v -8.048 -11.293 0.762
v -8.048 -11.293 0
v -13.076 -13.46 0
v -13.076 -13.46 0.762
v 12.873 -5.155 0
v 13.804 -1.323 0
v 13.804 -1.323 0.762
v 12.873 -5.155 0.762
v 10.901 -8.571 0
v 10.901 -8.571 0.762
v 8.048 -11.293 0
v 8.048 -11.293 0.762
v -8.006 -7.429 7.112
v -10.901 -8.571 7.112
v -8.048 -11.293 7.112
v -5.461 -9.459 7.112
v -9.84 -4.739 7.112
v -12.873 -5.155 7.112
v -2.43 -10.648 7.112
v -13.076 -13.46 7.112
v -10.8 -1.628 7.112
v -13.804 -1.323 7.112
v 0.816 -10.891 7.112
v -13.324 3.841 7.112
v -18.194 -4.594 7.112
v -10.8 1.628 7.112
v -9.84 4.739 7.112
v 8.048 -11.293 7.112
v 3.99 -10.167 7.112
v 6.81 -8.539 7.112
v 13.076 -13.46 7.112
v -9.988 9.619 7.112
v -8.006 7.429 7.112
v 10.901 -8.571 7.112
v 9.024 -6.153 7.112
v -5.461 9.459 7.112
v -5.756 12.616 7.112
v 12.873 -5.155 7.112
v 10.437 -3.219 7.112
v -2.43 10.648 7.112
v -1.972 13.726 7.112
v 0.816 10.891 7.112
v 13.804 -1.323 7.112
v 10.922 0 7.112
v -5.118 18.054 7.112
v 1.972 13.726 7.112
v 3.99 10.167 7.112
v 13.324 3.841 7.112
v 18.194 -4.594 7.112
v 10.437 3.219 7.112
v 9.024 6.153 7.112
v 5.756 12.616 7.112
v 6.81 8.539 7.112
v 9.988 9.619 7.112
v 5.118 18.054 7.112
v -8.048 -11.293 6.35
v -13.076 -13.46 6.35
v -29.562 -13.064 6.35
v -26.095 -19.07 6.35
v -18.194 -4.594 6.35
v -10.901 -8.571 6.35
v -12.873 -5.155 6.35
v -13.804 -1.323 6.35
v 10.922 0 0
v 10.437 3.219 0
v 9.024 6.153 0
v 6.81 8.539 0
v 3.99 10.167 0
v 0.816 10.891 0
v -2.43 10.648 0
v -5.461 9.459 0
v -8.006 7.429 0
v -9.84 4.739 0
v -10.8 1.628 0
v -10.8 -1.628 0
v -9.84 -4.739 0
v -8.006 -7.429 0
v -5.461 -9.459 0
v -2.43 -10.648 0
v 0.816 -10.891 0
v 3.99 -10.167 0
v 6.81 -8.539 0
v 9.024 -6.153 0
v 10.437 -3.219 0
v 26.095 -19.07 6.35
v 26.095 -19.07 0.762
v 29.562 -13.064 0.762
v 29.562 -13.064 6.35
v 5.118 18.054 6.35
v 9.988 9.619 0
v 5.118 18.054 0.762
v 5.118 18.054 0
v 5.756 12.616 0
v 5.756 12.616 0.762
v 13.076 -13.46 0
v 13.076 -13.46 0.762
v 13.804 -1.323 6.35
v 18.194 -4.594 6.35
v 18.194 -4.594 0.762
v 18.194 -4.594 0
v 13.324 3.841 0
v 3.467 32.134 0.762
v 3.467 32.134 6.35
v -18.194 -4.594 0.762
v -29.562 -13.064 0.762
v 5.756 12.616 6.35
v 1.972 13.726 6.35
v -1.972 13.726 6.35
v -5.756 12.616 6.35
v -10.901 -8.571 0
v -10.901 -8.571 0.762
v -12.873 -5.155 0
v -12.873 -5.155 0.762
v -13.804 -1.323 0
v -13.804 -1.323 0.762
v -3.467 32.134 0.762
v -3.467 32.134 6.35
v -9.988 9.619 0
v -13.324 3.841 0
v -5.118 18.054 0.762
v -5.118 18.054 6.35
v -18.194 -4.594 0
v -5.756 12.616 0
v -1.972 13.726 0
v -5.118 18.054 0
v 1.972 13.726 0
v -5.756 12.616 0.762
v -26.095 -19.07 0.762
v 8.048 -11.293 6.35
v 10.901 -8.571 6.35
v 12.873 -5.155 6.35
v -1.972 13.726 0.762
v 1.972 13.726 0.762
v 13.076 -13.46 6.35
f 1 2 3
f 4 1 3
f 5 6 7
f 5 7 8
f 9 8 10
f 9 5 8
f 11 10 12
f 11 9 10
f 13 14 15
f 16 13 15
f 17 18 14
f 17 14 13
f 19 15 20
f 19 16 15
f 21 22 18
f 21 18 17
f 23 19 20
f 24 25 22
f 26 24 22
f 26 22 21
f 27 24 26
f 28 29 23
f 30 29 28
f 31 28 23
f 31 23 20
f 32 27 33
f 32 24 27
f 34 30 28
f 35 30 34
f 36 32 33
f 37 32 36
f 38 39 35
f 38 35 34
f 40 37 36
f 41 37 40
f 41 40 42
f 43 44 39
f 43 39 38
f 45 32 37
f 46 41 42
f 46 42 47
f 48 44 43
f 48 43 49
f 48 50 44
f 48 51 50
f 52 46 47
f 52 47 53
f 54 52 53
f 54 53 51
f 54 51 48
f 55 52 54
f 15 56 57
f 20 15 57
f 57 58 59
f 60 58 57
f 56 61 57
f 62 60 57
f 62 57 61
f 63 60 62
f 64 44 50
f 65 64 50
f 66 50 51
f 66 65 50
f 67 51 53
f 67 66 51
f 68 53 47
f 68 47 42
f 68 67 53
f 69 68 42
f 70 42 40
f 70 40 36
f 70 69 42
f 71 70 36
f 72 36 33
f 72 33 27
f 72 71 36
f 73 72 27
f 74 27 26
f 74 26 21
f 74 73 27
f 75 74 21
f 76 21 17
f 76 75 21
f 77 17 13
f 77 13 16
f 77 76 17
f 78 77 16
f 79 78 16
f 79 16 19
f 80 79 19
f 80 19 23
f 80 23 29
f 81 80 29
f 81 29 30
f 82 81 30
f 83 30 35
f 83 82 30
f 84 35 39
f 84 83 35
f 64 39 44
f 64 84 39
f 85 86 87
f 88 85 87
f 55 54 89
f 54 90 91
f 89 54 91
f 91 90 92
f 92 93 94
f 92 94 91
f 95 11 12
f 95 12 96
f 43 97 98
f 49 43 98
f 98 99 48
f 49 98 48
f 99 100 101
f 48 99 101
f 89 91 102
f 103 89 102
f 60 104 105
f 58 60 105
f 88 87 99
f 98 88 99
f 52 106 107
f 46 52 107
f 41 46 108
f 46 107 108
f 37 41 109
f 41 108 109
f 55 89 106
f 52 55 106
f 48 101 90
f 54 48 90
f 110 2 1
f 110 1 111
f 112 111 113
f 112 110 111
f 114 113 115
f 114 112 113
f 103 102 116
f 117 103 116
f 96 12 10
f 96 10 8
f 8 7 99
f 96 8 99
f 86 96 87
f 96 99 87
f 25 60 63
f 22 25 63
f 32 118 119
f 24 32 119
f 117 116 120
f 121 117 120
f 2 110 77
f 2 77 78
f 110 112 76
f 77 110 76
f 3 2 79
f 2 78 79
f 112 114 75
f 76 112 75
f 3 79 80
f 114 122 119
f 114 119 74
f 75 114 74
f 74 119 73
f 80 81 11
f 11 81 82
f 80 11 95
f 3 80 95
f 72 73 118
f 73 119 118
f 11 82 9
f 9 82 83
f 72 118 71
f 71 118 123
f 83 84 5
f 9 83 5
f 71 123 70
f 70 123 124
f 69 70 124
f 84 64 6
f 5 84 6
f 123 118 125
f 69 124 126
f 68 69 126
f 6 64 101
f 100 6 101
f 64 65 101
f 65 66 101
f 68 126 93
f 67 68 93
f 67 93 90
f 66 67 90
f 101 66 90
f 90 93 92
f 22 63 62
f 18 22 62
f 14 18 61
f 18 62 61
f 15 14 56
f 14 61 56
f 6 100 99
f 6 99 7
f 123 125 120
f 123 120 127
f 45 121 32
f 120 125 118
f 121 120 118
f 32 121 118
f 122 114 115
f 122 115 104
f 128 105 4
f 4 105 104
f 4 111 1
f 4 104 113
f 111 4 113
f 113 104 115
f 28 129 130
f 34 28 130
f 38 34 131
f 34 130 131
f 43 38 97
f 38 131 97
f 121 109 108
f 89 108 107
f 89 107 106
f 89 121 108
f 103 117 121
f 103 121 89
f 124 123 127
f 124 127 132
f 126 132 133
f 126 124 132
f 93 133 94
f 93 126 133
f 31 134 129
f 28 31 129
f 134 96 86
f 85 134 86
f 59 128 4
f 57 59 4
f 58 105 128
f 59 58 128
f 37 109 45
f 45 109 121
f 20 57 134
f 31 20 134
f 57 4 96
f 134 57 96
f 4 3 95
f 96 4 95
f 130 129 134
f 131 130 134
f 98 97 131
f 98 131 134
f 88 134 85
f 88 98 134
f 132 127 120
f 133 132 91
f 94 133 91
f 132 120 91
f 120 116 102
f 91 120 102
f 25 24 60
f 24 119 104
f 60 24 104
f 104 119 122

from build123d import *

# Parameters (mm, degrees)
F0_R     = 10.922
F1_DEPTH = 7.112
F2_DEPTH = 6.35
F3_DEPTH = 0.762
F4_DEPTH = 7.112


with BuildPart() as f1:
    # F0 (on Top) → F1 (new body)
    with BuildSketch(Plane.XY):
        with BuildLine():
            Line((-5.7560840378, 12.6157379826), (-5.1183423957, 18.0540294813))
            Line((-5.1183423957, 18.0540294813), (-9.9884684203, 9.6187237673))
            ThreePointArc((-9.9884684203, 9.6187237673), (-8.0136294261, 11.3168499026), (-5.7560840378, 12.6157379826))
        make_face()
        with BuildLine():
            ThreePointArc((5.7560840378, 12.6157379826), (0, 13.8668434871), (-5.7560840378, 12.6157379826))
            ThreePointArc((-5.7560840378, 12.6157379826), (-8.0136294261, 11.3168499026), (-9.9884684203, 9.6187237673))
            Line((-9.9884684203, 9.6187237673), (-13.3242933447, 3.8409055132))
            ThreePointArc((-13.3242933447, 3.8409055132), (-13.8074942195, 1.2815817082), (-13.8035915993, -1.3229539883))
            ThreePointArc((-13.8035915993, -1.3229539883), (-12.0090387301, -6.9334217436), (-8.0475075615, -11.2927839943))
            ThreePointArc((-8.0475075615, -11.2927839943), (-5.7938647934, -12.5984316108), (-3.3358249243, -13.4596292806))
            Line((-3.3358249243, -13.4596292806), (3.3358249243, -13.4596292806))
            ThreePointArc((3.3358249243, -13.4596292806), (5.7938647934, -12.5984316108), (8.0475075615, -11.2927839943))
            ThreePointArc((8.0475075615, -11.2927839943), (12.0090387301, -6.9334217436), (13.8035915993, -1.3229539883))
            ThreePointArc((13.8035915993, -1.3229539883), (13.8510214888, -0.6622325982), (13.8668434871, 0))
            ThreePointArc((13.8668434871, 0), (13.730536018, 1.9395177119), (13.3242933447, 3.8409055132))
            Line((13.3242933447, 3.8409055132), (9.9884684203, 9.6187237673))
            ThreePointArc((9.9884684203, 9.6187237673), (8.0136294261, 11.3168499026), (5.7560840378, 12.6157379826))
        make_face()
        Circle(F0_R, mode=Mode.SUBTRACT)
        with BuildLine():
            Line((5.1183423957, 18.0540294813), (5.7560840378, 12.6157379826))
            ThreePointArc((5.7560840378, 12.6157379826), (8.0136294261, 11.3168499026), (9.9884684203, 9.6187237673))
            Line((9.9884684203, 9.6187237673), (5.1183423957, 18.0540294813))
        make_face()
        with BuildLine():
            ThreePointArc((-13.8035915993, -1.3229539883), (-13.8074942195, 1.2815817082), (-13.3242933447, 3.8409055132))
            Line((-13.3242933447, 3.8409055132), (-18.1944193693, -4.5944002008))
            Line((-18.1944193693, -4.5944002008), (-13.8035915993, -1.3229539883))
        make_face()
        with BuildLine():
            Line((18.1944193693, -4.5944002008), (13.3242933447, 3.8409055132))
            ThreePointArc((13.3242933447, 3.8409055132), (13.730536018, 1.9395177119), (13.8668434871, 0))
            ThreePointArc((13.8668434871, 0), (13.8510214888, -0.6622325982), (13.8035915993, -1.3229539883))
            Line((13.8035915993, -1.3229539883), (18.1944193693, -4.5944002008))
        make_face()
        with BuildLine():
            ThreePointArc((8.0475075615, -11.2927839943), (5.7938647934, -12.5984316108), (3.3358249243, -13.4596292806))
            Line((3.3358249243, -13.4596292806), (13.0760769737, -13.4596292806))
            Line((13.0760769737, -13.4596292806), (8.0475075615, -11.2927839943))
        make_face()
    extrude(amount=F1_DEPTH)

    # F0 (on Top) → F2 (join)
    with BuildSketch(Plane.XY):
        with BuildLine():
            ThreePointArc((-8.0475075615, -11.2927839943), (-12.0090387301, -6.9334217436), (-13.8035915993, -1.3229539883))
            Line((-13.8035915993, -1.3229539883), (-18.1944193693, -4.5944002008))
            Line((-18.1944193693, -4.5944002008), (-29.5624734591, -13.0643241977))
            Line((-29.5624734591, -13.0643241977), (-26.095273368, -19.0696909155))
            Line((-26.095273368, -19.0696909155), (-13.0760769737, -13.4596292806))
            Line((-13.0760769737, -13.4596292806), (-8.0475075615, -11.2927839943))
        make_face()
        with BuildLine():
            Line((-3.4672000911, 32.1340151131), (-5.1183423957, 18.0540294813))
            Line((-5.1183423957, 18.0540294813), (-5.7560840378, 12.6157379826))
            ThreePointArc((-5.7560840378, 12.6157379826), (0, 13.8668434871), (5.7560840378, 12.6157379826))
            Line((5.7560840378, 12.6157379826), (5.1183423957, 18.0540294813))
            Line((5.1183423957, 18.0540294813), (3.4672000911, 32.1340151131))
            Line((3.4672000911, 32.1340151131), (-3.4672000911, 32.1340151131))
        make_face()
        with BuildLine():
            Line((29.5624734591, -13.0643241977), (18.1944193693, -4.5944002008))
            Line((18.1944193693, -4.5944002008), (13.8035915993, -1.3229539883))
            ThreePointArc((13.8035915993, -1.3229539883), (12.0090387301, -6.9334217436), (8.0475075615, -11.2927839943))
            Line((8.0475075615, -11.2927839943), (13.0760769737, -13.4596292806))
            Line((13.0760769737, -13.4596292806), (26.095273368, -19.0696909155))
            Line((26.095273368, -19.0696909155), (29.5624734591, -13.0643241977))
        make_face()
    extrude(amount=F2_DEPTH)

    # F0 (on Top) → F3 (cut)
    with BuildSketch(Plane.XY):
        with BuildLine():
            Line((29.5624734591, -13.0643241977), (18.1944193693, -4.5944002008))
            Line((18.1944193693, -4.5944002008), (13.8035915993, -1.3229539883))
            ThreePointArc((13.8035915993, -1.3229539883), (12.0090387301, -6.9334217436), (8.0475075615, -11.2927839943))
            Line((8.0475075615, -11.2927839943), (13.0760769737, -13.4596292806))
            Line((13.0760769737, -13.4596292806), (26.095273368, -19.0696909155))
            Line((26.095273368, -19.0696909155), (29.5624734591, -13.0643241977))
        make_face()
        with BuildLine():
            Line((-3.4672000911, 32.1340151131), (-5.1183423957, 18.0540294813))
            Line((-5.1183423957, 18.0540294813), (-5.7560840378, 12.6157379826))
            ThreePointArc((-5.7560840378, 12.6157379826), (0, 13.8668434871), (5.7560840378, 12.6157379826))
            Line((5.7560840378, 12.6157379826), (5.1183423957, 18.0540294813))
            Line((5.1183423957, 18.0540294813), (3.4672000911, 32.1340151131))
            Line((3.4672000911, 32.1340151131), (-3.4672000911, 32.1340151131))
        make_face()
        with BuildLine():
            ThreePointArc((-8.0475075615, -11.2927839943), (-12.0090387301, -6.9334217436), (-13.8035915993, -1.3229539883))
            Line((-13.8035915993, -1.3229539883), (-18.1944193693, -4.5944002008))
            Line((-18.1944193693, -4.5944002008), (-29.5624734591, -13.0643241977))
            Line((-29.5624734591, -13.0643241977), (-26.095273368, -19.0696909155))
            Line((-26.095273368, -19.0696909155), (-13.0760769737, -13.4596292806))
            Line((-13.0760769737, -13.4596292806), (-8.0475075615, -11.2927839943))
        make_face()
    extrude(amount=F3_DEPTH, mode=Mode.SUBTRACT)

    # F0 (on Top) → F4 (join)
    with BuildSketch(Plane.XY):
        with BuildLine():
            ThreePointArc((-3.3358249243, -13.4596292806), (-5.7938647934, -12.5984316108), (-8.0475075615, -11.2927839943))
            Line((-8.0475075615, -11.2927839943), (-13.0760769737, -13.4596292806))
            Line((-13.0760769737, -13.4596292806), (-3.3358249243, -13.4596292806))
        make_face()
    extrude(amount=F4_DEPTH)


solid = f1.part
